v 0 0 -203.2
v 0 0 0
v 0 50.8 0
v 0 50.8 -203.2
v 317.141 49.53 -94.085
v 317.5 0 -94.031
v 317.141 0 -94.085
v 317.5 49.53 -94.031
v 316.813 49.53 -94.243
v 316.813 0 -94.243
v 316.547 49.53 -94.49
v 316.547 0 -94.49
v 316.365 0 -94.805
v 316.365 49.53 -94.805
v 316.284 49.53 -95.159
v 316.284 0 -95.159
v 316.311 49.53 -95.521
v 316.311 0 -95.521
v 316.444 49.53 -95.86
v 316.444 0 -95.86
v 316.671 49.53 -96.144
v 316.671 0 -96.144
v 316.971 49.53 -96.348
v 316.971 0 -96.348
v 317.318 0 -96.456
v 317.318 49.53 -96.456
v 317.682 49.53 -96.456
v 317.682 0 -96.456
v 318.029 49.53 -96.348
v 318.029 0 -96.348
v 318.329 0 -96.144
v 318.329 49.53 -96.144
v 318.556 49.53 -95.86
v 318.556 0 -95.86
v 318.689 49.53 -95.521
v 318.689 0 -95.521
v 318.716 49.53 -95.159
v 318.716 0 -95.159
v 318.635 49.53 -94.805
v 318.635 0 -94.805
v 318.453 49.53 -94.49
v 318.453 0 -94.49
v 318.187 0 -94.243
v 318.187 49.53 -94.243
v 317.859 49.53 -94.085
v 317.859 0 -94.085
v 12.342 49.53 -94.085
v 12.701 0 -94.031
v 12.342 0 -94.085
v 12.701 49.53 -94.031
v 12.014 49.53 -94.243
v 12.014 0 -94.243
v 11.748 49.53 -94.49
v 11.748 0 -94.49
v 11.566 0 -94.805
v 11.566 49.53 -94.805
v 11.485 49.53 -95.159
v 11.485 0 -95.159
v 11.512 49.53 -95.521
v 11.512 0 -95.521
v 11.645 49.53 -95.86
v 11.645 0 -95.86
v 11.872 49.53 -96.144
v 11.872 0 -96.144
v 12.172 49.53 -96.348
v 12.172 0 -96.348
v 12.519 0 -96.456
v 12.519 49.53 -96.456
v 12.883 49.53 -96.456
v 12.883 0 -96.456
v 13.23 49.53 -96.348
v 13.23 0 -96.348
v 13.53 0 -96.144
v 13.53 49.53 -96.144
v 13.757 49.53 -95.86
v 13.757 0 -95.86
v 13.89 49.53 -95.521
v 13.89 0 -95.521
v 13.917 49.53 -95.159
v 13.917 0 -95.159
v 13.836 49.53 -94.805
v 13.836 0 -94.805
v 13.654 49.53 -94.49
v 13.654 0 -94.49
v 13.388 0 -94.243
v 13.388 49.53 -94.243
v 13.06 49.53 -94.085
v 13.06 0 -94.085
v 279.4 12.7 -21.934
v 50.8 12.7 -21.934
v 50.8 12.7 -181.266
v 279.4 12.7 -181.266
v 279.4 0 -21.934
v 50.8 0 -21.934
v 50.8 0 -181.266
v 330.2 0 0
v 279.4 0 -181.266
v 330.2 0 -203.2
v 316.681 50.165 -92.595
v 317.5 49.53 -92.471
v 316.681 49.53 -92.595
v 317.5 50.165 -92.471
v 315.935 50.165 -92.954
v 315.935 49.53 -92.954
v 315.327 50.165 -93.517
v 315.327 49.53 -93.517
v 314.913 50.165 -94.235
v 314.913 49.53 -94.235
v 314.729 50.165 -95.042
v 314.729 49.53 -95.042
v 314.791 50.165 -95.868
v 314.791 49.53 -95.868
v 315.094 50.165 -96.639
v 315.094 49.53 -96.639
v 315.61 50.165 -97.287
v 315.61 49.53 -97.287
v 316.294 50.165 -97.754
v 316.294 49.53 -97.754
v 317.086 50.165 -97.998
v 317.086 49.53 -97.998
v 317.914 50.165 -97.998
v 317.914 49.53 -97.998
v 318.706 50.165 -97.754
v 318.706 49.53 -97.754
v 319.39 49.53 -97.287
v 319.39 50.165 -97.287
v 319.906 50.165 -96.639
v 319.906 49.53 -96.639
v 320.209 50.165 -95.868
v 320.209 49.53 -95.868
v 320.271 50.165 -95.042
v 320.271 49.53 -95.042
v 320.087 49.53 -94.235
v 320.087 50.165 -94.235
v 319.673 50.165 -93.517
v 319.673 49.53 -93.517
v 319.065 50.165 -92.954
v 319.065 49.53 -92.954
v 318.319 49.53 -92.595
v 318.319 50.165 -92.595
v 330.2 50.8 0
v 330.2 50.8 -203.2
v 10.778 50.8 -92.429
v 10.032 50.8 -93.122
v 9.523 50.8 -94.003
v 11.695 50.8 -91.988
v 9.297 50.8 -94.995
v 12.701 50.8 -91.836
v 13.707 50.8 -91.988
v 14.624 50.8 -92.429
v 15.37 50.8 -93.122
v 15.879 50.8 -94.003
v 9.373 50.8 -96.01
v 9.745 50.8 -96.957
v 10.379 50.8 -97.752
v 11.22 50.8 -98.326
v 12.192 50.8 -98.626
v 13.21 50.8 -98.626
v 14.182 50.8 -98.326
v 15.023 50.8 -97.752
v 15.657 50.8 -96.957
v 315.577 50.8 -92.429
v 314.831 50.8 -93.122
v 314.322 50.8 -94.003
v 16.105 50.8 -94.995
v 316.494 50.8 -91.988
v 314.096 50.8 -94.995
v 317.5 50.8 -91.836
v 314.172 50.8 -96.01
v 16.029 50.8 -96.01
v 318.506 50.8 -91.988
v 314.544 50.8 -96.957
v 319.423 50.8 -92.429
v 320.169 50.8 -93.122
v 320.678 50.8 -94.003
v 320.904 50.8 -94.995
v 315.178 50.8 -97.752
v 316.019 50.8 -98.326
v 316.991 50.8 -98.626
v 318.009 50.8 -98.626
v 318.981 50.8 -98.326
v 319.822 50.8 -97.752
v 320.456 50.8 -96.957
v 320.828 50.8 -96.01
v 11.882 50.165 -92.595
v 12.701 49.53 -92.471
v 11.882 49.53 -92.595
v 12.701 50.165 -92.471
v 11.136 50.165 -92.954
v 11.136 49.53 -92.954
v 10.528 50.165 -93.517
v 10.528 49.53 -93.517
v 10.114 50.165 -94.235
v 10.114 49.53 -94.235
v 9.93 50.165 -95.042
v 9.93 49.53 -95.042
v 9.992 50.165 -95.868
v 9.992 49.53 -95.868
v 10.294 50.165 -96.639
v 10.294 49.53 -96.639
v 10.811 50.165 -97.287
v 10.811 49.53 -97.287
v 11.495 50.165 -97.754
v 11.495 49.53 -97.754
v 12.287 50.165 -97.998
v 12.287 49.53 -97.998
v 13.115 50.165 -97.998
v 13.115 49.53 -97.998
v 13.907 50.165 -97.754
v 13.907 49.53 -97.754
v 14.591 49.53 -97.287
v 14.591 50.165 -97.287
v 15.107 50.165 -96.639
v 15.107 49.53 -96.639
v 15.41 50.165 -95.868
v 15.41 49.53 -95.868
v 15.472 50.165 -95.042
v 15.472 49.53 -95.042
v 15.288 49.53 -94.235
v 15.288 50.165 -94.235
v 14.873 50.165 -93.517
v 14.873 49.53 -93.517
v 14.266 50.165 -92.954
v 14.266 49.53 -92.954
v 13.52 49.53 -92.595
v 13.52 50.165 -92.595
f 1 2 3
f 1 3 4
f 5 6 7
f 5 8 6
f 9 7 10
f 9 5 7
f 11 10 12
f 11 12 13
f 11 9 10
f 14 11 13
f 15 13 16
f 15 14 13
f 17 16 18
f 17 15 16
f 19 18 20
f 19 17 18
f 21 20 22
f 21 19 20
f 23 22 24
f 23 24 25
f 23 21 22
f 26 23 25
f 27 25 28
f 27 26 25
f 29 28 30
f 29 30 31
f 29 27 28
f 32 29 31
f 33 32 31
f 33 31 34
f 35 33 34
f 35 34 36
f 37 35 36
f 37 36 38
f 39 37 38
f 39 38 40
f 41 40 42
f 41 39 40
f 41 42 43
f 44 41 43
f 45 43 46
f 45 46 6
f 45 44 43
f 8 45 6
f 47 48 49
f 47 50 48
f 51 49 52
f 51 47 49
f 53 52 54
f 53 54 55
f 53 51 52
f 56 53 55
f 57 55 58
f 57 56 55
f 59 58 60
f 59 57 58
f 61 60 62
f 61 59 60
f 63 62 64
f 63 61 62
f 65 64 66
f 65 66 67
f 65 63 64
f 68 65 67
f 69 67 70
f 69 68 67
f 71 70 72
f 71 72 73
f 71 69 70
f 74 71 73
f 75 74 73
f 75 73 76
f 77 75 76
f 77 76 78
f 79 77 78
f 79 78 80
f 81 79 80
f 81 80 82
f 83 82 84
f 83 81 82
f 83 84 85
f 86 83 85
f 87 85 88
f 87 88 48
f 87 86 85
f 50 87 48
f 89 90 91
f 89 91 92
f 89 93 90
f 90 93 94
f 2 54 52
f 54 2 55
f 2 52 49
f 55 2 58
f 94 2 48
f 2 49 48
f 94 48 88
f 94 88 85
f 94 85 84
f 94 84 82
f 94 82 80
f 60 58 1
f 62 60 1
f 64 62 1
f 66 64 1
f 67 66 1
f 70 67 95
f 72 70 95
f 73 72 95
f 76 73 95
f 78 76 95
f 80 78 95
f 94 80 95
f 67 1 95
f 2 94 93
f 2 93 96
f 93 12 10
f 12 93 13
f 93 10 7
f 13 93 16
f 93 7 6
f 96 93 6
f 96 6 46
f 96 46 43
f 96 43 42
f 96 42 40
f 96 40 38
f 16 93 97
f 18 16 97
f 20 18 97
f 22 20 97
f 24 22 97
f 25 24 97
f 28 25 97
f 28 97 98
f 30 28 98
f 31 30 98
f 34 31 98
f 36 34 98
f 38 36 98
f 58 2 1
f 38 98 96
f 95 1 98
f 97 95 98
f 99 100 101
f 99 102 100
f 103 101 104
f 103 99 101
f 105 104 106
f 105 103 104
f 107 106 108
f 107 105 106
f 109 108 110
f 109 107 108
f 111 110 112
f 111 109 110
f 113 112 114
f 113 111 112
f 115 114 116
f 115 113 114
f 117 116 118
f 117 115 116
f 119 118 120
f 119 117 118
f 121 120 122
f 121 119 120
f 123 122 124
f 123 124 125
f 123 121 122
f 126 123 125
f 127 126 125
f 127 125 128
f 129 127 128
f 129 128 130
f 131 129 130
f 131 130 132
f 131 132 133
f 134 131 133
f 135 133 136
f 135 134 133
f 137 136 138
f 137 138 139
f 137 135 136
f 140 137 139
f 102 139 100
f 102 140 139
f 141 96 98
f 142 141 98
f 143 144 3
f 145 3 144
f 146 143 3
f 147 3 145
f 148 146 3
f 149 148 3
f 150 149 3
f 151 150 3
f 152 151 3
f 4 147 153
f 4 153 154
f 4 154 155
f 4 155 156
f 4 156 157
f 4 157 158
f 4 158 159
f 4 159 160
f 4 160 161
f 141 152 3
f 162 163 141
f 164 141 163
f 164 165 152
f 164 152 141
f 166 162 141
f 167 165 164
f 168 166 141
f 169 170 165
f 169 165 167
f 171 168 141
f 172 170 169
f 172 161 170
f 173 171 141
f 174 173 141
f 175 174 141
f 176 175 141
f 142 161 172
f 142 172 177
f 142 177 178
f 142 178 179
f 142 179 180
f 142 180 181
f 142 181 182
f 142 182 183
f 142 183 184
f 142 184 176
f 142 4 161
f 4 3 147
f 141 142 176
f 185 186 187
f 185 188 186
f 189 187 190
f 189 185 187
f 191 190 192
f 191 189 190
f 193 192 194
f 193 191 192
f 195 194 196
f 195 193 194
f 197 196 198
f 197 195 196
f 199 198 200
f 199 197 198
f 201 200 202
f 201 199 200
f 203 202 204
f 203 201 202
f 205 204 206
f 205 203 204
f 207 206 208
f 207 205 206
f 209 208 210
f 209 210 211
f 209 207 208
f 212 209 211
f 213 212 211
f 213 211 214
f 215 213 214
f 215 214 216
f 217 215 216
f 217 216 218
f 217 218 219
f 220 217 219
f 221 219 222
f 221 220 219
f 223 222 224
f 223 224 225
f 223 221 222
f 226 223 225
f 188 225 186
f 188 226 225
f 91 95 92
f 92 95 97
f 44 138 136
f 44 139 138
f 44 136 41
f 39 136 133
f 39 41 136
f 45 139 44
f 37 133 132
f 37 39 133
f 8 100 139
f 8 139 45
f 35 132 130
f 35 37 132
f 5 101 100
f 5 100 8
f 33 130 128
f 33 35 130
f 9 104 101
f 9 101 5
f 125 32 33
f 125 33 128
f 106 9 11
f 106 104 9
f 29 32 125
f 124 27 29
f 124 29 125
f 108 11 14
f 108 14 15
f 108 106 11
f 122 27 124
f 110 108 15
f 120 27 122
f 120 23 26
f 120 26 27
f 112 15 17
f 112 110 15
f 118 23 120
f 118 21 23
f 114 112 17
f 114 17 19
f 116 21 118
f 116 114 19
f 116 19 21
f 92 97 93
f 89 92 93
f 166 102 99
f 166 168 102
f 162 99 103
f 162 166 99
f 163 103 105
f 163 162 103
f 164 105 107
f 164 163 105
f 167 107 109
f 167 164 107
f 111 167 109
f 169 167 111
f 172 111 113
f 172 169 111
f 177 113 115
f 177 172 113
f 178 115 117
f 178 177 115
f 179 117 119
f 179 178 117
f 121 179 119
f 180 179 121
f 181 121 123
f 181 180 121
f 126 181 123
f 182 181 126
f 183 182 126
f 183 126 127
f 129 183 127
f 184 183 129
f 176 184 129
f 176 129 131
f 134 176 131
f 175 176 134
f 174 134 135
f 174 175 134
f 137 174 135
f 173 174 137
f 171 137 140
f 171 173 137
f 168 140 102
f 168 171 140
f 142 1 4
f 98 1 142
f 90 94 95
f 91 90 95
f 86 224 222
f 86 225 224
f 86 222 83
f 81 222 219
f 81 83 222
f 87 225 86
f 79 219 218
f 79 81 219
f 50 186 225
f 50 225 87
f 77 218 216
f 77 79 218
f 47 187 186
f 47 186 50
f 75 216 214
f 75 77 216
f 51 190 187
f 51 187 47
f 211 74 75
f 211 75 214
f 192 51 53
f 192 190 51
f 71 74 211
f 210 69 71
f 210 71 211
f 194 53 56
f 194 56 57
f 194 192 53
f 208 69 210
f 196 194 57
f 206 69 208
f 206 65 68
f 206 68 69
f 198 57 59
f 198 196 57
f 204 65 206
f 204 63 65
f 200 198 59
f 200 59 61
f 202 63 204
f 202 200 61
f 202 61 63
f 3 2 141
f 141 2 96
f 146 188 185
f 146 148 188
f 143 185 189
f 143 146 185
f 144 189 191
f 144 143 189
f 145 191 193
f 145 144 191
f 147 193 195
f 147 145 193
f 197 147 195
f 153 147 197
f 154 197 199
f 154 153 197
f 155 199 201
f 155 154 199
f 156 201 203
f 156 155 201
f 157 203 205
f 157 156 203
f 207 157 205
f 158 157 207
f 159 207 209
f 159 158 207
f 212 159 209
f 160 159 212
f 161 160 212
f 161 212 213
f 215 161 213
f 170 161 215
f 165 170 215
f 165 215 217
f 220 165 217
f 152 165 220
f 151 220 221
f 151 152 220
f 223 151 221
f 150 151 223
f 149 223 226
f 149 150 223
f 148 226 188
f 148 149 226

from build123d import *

# Parameters (mm, degrees)
SKETCH1_W                                   = 330.2
SKETCH1_H                                   = 203.2
BOSS_EXTRUDE1_DEPTH                         = 50.8
CUT_EXTRUDE1_DEPTH                          = 12.7
CBORE_FOR_2_BINDING_HEAD_MACHINE_SC_2_COUNT = 2
CBORE_FOR_2_BINDING_HEAD_MACHINE_SC_2_PITCH = 304.799059425


with BuildPart() as part:
    # Sketch1 → Boss-Extrude1 (new body)
    with BuildSketch(Plane(origin=(0, 0, 0), x_dir=(1, 0, 0), z_dir=(0, 1, 0))):
        with Locations((165.1, 101.6)):
            Rectangle(SKETCH1_W, SKETCH1_H)
    extrude(amount=BOSS_EXTRUDE1_DEPTH)

    # Sketch3 → Cut-Extrude1 (cut)
    with BuildSketch(Plane.XZ):
        Polygon((279.4, -181.265982614), (279.4, -104.941398829), (279.4, -104.237946444), (279.4, -21.934017386), (50.8, -21.934017386), (50.8, -181.265982614), align=None)
    extrude(amount=-CUT_EXTRUDE1_DEPTH, mode=Mode.SUBTRACT)

    # Sketch5 → CBORE for #2 Binding Head Machine Screw1 (revolve, cut)
    with BuildSketch(Plane(origin=(12.700940575, 50.8, -95.25), x_dir=(0, 0, 1), z_dir=(1, 0, 0))):
        Polygon((0, 0), (0, 50.8), (1.2192, 50.8), (1.2192, 1.27), (2.77876, 1.27), (2.77876, 0.635), (3.41376, 0), align=None)
    cbore_for_2_binding_head_machine_screw1 = revolve(axis=Axis((12.700940575, 57.15, -95.25), (0, -1, 0)), mode=Mode.SUBTRACT)

    # CBORE for _2 Binding Head Machine Sc 2: CBORE for #2 Binding Head Machine Screw1 ×2
    with Locations(*[(i * CBORE_FOR_2_BINDING_HEAD_MACHINE_SC_2_PITCH, 0, 0) for i in range(1, CBORE_FOR_2_BINDING_HEAD_MACHINE_SC_2_COUNT)]):
        add(cbore_for_2_binding_head_machine_screw1, mode=Mode.SUBTRACT)


solid = part.part
